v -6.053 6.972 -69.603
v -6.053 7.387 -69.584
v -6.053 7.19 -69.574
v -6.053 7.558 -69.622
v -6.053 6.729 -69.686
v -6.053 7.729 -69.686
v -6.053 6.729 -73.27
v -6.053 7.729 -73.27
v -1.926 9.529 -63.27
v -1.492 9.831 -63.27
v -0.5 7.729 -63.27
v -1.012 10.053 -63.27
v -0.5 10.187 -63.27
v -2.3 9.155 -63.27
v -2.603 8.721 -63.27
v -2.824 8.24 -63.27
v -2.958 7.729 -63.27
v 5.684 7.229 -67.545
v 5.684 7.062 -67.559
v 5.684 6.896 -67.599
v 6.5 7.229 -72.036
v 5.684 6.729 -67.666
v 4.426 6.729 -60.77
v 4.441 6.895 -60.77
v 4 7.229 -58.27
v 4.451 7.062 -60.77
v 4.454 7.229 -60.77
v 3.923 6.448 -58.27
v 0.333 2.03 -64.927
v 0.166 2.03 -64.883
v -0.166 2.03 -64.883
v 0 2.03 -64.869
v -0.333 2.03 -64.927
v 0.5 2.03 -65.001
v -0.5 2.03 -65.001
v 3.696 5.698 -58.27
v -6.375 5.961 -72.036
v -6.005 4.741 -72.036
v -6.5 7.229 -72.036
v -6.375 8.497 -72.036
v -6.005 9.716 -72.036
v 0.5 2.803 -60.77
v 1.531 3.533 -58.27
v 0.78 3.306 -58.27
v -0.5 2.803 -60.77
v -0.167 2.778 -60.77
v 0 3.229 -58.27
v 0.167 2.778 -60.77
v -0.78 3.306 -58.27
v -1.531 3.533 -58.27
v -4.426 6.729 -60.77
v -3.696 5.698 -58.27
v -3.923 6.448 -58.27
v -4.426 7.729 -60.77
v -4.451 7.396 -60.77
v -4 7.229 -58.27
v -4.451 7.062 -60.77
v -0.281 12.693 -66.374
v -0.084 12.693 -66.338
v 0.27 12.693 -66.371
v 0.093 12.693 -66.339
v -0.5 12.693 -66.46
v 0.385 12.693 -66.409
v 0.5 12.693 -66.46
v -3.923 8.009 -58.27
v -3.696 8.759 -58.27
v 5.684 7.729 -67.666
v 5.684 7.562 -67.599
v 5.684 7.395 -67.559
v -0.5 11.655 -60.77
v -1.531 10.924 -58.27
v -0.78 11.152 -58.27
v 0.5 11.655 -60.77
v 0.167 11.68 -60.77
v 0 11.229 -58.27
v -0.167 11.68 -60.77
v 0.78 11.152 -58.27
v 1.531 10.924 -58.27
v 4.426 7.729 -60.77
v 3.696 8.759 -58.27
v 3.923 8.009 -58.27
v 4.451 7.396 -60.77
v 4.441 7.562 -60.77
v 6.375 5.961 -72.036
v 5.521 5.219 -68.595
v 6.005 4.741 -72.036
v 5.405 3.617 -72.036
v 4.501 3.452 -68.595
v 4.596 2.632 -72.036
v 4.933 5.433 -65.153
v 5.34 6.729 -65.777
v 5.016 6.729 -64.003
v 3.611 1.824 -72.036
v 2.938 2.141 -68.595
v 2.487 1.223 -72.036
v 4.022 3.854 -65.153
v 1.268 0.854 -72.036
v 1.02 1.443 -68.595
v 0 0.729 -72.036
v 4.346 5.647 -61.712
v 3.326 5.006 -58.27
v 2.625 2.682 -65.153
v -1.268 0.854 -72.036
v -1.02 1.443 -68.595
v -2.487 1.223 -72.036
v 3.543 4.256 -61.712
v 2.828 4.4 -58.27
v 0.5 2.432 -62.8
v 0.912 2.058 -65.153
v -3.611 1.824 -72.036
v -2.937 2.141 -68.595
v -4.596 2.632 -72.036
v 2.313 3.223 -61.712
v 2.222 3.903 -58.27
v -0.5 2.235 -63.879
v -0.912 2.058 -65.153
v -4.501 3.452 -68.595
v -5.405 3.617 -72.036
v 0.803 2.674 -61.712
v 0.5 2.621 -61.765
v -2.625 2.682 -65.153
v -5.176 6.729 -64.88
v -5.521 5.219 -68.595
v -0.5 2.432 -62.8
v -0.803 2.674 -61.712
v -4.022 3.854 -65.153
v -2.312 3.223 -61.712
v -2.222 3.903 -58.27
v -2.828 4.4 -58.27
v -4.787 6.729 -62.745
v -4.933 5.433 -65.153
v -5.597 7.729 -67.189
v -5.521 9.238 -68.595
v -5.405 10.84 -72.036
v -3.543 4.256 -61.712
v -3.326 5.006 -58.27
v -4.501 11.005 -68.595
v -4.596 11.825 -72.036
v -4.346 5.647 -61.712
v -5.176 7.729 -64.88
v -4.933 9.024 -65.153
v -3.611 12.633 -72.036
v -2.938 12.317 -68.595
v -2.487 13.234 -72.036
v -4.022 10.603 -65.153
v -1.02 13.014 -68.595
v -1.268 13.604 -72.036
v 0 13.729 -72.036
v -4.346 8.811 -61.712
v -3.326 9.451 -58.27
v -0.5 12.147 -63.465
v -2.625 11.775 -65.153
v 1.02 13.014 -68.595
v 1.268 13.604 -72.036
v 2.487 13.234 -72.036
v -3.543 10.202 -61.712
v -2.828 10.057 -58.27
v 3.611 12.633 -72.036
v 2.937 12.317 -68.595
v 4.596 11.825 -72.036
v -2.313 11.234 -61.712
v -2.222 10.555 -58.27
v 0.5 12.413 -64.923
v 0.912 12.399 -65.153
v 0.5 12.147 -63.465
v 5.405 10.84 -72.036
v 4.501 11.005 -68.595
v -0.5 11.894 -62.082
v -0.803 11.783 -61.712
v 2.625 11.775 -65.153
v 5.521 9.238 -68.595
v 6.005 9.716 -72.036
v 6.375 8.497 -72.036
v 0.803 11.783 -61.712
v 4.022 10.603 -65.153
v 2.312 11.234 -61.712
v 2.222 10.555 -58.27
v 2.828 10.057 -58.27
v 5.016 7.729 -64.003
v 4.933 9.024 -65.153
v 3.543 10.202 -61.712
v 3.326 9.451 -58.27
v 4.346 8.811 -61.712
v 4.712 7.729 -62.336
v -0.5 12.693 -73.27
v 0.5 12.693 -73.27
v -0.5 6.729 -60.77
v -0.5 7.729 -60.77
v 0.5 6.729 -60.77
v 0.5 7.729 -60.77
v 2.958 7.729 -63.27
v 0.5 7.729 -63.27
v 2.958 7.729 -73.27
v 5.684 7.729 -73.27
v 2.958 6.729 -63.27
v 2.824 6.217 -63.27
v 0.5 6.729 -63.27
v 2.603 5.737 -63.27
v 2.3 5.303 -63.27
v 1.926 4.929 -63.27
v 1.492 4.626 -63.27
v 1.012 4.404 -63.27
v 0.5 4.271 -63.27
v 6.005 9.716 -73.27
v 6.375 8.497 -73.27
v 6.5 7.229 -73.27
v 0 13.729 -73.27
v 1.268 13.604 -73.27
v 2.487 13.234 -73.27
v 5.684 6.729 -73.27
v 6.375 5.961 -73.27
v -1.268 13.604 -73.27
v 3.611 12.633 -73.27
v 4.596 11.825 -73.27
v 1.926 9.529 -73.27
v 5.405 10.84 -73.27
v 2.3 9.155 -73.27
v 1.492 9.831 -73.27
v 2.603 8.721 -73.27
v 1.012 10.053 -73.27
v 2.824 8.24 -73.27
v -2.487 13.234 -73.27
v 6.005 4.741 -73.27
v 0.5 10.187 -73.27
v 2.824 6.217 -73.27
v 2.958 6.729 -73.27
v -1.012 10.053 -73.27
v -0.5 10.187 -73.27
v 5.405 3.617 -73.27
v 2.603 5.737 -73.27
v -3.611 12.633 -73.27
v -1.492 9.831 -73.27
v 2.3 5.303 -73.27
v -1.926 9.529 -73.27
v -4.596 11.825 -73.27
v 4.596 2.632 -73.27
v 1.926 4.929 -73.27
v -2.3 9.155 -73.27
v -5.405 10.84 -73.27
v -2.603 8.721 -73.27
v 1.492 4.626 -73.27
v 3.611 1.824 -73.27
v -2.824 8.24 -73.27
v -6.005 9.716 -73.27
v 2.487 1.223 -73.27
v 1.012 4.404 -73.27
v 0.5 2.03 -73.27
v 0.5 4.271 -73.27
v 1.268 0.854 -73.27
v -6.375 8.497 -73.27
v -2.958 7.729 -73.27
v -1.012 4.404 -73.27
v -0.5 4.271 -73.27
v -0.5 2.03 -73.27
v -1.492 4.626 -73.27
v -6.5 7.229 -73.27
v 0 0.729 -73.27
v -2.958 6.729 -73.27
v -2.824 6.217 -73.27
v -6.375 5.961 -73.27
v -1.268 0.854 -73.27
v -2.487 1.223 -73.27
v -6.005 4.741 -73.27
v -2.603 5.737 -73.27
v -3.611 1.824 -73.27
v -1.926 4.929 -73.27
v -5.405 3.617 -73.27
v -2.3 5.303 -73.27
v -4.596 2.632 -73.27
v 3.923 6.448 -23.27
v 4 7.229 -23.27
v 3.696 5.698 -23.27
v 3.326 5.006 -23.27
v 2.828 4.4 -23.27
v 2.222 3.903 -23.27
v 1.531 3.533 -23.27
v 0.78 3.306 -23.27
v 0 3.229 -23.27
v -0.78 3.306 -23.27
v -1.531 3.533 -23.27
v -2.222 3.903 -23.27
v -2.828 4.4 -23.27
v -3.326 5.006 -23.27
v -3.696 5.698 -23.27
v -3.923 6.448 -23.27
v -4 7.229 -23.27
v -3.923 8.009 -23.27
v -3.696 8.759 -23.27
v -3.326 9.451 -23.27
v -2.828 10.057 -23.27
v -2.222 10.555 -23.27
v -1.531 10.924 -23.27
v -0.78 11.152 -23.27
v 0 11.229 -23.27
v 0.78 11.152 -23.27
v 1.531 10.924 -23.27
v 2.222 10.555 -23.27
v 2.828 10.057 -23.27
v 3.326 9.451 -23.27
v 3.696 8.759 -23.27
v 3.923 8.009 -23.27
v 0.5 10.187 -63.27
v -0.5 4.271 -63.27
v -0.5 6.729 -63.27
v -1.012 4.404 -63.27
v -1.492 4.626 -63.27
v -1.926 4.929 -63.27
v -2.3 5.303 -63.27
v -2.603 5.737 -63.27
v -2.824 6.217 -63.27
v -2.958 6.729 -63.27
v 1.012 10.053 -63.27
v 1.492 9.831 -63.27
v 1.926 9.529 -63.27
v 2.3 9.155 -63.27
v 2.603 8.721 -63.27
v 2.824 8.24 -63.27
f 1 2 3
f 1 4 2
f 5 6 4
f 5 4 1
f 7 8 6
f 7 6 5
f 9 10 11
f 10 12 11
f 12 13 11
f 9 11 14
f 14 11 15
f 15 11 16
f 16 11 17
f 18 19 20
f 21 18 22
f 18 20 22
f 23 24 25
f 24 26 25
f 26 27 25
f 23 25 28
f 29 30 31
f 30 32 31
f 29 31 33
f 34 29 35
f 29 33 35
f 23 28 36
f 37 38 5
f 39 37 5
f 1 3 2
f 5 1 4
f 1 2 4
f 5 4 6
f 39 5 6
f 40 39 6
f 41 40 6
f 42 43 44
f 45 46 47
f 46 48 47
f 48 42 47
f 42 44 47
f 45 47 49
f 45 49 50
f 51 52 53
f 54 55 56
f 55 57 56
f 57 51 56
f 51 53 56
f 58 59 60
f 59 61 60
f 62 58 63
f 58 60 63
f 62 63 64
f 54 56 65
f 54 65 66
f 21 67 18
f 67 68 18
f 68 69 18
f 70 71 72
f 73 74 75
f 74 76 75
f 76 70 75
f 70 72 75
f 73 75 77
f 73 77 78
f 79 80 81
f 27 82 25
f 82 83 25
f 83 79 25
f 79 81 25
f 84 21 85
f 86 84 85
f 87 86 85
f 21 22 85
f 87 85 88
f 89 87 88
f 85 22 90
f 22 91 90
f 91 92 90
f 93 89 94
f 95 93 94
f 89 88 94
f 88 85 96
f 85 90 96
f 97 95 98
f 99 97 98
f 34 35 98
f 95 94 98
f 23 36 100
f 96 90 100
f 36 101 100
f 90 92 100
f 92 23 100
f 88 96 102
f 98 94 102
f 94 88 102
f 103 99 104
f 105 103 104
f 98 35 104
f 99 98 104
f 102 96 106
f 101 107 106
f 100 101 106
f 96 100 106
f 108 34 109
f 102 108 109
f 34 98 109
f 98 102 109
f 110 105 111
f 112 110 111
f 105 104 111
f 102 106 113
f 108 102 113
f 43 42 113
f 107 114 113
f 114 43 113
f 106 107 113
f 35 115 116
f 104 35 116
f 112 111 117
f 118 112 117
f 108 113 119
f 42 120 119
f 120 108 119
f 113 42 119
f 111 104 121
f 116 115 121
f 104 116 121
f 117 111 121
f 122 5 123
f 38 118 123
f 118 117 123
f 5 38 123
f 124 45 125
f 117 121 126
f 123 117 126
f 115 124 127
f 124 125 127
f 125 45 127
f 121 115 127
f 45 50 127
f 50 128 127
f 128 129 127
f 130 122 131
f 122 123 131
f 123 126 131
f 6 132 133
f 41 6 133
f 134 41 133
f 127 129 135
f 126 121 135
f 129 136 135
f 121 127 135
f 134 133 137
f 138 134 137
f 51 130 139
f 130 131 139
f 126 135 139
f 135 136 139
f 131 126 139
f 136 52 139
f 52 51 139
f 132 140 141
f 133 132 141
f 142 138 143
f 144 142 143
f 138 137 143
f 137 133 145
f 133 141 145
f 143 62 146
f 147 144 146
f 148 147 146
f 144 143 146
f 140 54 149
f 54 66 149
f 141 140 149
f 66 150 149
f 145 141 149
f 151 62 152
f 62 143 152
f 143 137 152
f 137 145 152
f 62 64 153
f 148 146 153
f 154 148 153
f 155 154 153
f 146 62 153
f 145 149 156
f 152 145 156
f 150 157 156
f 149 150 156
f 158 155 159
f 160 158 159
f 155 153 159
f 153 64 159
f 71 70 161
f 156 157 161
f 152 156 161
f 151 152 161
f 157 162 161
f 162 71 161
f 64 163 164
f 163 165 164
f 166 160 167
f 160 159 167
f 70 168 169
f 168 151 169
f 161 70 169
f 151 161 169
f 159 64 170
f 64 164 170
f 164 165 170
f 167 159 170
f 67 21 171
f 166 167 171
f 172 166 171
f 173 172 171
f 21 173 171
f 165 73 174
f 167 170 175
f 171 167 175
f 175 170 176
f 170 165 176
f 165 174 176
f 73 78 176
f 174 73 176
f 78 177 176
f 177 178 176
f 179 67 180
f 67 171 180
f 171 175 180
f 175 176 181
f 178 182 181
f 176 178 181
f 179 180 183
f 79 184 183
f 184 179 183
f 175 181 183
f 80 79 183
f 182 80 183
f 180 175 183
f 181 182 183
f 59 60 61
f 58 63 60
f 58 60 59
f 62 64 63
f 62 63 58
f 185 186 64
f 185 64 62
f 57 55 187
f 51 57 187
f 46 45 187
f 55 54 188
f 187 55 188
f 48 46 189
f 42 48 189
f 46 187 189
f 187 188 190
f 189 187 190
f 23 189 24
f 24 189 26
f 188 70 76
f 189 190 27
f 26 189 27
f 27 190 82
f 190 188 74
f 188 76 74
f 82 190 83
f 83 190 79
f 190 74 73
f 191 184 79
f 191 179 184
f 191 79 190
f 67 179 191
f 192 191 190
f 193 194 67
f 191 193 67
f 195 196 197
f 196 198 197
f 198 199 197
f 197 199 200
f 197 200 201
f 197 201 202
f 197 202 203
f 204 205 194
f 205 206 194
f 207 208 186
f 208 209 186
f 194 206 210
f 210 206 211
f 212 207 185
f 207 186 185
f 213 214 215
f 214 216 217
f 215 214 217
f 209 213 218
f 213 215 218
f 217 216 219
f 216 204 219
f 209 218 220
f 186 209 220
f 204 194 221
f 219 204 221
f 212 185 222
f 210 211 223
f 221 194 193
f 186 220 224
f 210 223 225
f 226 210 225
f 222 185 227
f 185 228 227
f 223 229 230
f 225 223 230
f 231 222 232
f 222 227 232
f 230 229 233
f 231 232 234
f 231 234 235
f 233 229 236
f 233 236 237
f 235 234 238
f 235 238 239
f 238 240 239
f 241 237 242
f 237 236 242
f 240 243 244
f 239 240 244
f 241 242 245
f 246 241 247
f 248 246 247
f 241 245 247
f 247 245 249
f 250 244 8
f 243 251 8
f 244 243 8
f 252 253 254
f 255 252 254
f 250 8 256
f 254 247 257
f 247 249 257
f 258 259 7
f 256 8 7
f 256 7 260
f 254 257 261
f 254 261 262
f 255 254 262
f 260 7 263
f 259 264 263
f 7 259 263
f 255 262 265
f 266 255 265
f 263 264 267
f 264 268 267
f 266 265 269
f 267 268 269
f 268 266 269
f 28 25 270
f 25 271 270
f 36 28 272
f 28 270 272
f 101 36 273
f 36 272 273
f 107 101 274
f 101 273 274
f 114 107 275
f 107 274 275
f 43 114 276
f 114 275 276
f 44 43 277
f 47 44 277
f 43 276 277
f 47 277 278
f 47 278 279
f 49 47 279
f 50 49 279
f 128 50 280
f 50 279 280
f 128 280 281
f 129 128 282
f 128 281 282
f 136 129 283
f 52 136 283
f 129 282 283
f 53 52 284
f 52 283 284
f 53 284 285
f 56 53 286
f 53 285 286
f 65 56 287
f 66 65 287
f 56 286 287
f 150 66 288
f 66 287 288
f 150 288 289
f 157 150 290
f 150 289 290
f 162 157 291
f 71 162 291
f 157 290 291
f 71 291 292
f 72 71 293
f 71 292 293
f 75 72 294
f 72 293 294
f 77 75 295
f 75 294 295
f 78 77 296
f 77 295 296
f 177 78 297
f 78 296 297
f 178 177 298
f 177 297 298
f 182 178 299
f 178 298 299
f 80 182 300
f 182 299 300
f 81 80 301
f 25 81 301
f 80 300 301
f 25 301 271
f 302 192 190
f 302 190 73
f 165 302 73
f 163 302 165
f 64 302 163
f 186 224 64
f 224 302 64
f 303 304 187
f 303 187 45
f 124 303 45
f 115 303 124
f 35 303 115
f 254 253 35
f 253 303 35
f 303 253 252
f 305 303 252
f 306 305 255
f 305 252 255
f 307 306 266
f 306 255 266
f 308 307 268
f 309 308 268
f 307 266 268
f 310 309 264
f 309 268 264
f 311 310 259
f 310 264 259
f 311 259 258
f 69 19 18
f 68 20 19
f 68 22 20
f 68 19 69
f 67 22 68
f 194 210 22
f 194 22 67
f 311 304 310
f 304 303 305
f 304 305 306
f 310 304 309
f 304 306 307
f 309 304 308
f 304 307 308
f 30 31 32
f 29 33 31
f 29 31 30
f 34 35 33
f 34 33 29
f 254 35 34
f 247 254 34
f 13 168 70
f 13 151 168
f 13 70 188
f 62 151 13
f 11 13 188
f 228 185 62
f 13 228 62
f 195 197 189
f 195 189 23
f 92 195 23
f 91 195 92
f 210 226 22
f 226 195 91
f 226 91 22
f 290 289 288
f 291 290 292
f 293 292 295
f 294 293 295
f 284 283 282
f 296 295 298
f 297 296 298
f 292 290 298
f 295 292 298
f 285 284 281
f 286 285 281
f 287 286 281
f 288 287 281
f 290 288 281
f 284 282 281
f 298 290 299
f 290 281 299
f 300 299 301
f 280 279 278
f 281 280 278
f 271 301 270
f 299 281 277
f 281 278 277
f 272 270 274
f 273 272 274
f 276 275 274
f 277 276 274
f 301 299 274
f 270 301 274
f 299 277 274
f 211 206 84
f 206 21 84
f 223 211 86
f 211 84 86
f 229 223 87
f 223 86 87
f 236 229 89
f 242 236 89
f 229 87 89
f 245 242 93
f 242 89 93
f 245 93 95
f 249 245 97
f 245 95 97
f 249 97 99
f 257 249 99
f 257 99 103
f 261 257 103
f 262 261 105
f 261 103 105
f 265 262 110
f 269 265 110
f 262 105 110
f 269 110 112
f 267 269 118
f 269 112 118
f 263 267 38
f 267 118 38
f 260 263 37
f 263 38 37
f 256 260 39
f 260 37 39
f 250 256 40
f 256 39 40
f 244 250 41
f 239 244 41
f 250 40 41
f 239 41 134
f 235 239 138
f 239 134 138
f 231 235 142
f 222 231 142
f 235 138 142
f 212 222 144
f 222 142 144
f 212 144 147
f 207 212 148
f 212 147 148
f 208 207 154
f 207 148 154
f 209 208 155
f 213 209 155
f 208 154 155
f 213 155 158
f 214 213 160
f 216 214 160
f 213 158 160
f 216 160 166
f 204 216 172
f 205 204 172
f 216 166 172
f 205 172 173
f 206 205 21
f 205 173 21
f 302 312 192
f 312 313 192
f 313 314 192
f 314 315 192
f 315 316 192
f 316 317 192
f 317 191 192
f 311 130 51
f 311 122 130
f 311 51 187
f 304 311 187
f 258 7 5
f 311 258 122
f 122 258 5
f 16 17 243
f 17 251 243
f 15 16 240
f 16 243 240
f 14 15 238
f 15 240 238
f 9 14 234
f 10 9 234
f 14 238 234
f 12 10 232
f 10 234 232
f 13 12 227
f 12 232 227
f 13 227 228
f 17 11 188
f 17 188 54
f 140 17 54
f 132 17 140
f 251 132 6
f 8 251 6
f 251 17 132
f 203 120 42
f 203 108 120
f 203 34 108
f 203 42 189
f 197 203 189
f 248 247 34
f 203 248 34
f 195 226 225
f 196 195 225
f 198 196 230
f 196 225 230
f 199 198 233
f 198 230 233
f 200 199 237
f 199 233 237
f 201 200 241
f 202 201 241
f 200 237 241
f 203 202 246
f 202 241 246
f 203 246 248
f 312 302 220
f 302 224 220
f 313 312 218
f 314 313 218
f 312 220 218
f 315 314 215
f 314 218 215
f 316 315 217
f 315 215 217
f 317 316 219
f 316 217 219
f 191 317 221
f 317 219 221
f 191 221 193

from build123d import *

# Parameters (mm, degrees)
ENL_V_MAT_EXTRU_1_DEPTH = 12.5


with BuildPart() as part:
    # Esquisse1 → Révolution1 (revolve)
    with BuildSketch(Plane(origin=(0, 0, 0), x_dir=(0, 0, -1), z_dir=(1, 0, 0)), mode=Mode.PRIVATE) as r_volution1_sk:
        Polygon((73.269946074, 13.728692904), (72.036236822, 13.728692904), (58.269946074, 11.228692904), (23.269946074, 11.228692904), (23.269946074, 7.228692904), (63.269946074, 7.228692904), (63.269946074, 10.228692904), (73.269946074, 10.228692904), align=None)
    revolve(r_volution1_sk.sketch.rotate(Axis((0, 7.228692904, -23.269946074), (0, 0, -1)), 90), axis=Axis((0, 7.228692904, -23.269946074), (0, 0, -1)))

    # Esquisse12 → Enlèv. mat.-Extru.1 (cut)
    with BuildSketch(Plane(origin=(0, 0, -73.269946074), x_dir=(-1, 0, 0), z_dir=(0, 0, -1))):
        Polygon((0.5, 7.728692904), (6.052650367, 7.728692904), (6.052650367, 6.728692904), (0.5, 6.728692904), (0.5, 2.030323732), (-0.5, 2.030323732), (-0.5, 6.728692904), (-5.684461256, 6.728692904), (-5.684461256, 7.728692904), (-0.5, 7.728692904), (-0.5, 12.693209271), (0.5, 12.693209271), align=None)
    extrude(amount=-ENL_V_MAT_EXTRU_1_DEPTH, mode=Mode.SUBTRACT)


solid = part.part
